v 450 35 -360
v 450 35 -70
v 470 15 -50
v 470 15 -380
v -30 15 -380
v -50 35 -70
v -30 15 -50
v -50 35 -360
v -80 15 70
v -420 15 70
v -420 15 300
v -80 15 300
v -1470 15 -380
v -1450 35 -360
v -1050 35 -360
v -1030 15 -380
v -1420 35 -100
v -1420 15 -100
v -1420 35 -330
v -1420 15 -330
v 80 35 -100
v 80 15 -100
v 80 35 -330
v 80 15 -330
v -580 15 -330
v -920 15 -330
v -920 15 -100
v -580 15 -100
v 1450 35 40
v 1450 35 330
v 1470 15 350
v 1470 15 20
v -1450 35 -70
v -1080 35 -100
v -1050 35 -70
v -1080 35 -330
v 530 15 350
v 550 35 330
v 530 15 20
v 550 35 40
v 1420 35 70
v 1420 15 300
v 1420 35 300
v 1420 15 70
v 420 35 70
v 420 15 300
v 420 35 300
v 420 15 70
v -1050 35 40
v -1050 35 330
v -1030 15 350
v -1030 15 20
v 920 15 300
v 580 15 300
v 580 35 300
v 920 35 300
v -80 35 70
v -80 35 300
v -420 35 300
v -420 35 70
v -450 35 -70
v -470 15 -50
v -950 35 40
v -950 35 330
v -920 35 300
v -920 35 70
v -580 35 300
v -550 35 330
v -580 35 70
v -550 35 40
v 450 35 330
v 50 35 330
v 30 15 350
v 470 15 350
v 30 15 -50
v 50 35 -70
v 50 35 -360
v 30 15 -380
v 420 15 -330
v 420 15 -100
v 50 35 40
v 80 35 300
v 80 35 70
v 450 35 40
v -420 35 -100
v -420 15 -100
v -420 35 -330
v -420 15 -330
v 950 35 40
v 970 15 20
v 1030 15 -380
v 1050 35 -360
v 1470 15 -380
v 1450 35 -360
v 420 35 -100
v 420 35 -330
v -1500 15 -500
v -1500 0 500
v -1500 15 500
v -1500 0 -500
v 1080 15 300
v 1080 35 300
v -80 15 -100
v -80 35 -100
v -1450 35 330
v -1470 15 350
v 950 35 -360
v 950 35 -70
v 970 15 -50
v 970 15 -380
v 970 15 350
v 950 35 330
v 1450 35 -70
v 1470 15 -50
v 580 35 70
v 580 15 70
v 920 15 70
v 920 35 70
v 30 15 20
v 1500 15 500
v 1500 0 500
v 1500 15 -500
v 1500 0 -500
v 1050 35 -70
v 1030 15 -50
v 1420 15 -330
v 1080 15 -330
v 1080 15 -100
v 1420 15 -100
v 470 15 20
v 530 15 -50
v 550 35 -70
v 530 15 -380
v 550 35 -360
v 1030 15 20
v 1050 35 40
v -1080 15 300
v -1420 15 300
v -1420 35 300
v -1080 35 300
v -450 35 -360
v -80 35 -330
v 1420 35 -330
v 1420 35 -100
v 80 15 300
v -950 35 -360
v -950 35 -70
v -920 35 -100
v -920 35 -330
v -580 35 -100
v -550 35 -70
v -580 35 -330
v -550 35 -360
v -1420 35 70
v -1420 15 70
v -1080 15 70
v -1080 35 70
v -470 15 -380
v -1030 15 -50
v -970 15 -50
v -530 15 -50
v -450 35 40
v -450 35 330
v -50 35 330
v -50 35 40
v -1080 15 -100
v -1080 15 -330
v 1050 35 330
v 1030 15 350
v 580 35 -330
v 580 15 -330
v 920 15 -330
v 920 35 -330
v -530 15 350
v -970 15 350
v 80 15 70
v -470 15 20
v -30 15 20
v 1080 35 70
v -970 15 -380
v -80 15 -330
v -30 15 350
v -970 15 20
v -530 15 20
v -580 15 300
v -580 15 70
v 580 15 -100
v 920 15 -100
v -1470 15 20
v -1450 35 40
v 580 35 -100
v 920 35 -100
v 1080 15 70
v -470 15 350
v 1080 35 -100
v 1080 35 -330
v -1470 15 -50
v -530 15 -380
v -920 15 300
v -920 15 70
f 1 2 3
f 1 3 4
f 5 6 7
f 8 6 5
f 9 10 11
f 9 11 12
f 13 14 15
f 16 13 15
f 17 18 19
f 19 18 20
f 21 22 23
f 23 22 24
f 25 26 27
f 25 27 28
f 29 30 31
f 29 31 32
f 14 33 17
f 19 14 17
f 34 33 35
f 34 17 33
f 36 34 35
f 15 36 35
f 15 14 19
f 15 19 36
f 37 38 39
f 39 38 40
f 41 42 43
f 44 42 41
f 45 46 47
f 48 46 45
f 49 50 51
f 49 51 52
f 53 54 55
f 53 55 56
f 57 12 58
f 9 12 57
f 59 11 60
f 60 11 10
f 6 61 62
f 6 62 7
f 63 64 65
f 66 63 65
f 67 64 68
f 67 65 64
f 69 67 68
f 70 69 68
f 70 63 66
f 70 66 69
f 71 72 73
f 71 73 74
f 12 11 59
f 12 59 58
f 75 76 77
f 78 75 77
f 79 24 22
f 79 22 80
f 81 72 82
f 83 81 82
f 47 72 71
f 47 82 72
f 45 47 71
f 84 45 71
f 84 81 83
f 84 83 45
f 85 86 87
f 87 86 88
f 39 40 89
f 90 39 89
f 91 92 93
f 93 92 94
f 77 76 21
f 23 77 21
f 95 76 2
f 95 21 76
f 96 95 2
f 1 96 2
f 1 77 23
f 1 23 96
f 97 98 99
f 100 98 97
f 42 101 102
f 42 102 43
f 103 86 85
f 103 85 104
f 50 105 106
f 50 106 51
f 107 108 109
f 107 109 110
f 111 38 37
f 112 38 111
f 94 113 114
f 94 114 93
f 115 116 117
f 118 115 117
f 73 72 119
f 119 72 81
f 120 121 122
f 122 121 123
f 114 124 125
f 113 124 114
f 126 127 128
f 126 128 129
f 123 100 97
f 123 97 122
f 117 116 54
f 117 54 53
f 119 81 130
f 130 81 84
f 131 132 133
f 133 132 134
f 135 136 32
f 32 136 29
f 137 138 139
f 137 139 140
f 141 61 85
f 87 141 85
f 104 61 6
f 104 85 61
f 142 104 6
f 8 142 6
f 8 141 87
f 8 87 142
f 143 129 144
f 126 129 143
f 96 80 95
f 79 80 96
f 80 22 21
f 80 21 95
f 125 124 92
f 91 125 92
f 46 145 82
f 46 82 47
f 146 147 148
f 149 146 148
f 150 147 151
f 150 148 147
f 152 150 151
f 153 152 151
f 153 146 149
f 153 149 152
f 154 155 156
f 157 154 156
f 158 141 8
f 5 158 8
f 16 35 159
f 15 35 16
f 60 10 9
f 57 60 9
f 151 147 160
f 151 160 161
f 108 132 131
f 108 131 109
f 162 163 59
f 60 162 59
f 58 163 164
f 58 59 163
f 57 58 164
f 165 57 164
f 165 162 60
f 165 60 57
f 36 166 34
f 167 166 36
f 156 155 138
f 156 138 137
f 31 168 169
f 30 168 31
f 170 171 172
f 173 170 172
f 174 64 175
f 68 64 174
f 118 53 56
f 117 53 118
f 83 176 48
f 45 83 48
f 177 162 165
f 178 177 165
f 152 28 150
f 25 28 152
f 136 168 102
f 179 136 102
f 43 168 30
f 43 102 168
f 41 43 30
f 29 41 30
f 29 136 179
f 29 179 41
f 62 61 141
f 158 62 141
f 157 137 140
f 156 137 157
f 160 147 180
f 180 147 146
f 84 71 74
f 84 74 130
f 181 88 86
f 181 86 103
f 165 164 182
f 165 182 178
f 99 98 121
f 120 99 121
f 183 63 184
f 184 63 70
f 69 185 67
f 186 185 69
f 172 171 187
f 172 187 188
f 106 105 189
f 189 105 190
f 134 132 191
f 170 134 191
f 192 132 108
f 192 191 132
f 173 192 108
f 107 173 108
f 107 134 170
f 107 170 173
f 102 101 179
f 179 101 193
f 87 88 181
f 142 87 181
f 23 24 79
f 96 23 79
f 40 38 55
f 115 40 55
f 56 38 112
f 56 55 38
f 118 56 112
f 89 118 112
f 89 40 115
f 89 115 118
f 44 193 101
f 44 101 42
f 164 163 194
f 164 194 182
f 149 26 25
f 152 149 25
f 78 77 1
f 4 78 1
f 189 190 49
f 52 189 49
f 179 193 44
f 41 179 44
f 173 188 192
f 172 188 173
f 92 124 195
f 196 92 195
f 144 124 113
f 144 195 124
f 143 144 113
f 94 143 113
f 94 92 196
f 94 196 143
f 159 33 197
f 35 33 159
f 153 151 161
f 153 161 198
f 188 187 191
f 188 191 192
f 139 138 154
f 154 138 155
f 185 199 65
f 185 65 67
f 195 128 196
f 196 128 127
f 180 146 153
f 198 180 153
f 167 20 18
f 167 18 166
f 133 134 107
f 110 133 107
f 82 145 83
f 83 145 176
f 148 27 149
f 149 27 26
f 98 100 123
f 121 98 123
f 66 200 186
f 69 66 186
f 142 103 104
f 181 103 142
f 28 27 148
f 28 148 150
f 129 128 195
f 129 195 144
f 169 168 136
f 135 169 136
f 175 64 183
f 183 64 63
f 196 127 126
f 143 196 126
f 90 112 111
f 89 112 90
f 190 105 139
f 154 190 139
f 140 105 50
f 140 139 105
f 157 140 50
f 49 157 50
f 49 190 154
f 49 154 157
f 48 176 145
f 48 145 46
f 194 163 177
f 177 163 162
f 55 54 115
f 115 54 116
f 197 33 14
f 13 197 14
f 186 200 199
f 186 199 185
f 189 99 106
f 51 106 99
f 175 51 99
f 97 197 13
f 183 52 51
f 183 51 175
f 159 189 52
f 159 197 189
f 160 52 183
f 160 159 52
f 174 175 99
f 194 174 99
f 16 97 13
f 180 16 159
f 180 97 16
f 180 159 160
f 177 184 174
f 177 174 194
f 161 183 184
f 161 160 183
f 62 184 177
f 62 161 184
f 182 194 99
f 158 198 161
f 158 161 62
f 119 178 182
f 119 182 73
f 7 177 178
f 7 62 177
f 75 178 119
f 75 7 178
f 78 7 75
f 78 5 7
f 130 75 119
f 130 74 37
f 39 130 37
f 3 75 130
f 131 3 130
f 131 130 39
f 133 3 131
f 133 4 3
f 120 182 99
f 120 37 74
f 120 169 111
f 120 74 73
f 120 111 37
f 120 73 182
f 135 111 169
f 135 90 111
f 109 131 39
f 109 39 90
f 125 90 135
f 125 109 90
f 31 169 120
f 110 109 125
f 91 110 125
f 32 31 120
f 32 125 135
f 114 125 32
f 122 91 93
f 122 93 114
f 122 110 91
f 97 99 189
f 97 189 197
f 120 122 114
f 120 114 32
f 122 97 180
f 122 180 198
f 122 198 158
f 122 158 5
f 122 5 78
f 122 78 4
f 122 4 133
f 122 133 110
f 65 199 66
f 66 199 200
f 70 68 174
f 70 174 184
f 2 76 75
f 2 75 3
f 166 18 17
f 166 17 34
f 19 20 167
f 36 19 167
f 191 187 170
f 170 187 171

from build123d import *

# Parameters (mm, degrees)
SKETCH1_W                  = 3000
SKETCH1_H                  = 1000
BOSS_EXTRUDE1_DEPTH        = 15
SKETCH2_W                  = 400
SKETCH2_H                  = 290
SKETCH2_W_2                = 340
SKETCH2_H_2                = 230
BOSS_EXTRUDE2_DEPTH        = 20
CHAMFER1_SIZE              = 20
LPATTERN1_COUNT            = 6
LPATTERN1_PITCH            = 500
LPATTERN1_COUNT_DIR2       = 2
LPATTERN1_PITCH_DIR2       = 400
CHAMFER1_OF_LPATTERN1_SIZE = 20


with BuildPart() as part:
    # Sketch1 → Boss-Extrude1 (new body)
    with BuildSketch(Plane(origin=(0, 0, 0), x_dir=(1, 0, 0), z_dir=(0, 1, 0))):
        Rectangle(SKETCH1_W, SKETCH1_H)
    extrude(amount=BOSS_EXTRUDE1_DEPTH)

    # Sketch2 → Boss-Extrude2 (add)
    with BuildSketch(Plane(origin=(0, 15, 0), x_dir=(1, 0, 0), z_dir=(0, 1, 0))):
        with Locations((-1250, -185)):
            Rectangle(SKETCH2_W, SKETCH2_H)
        with Locations((-1250, -185)):
            Rectangle(SKETCH2_W_2, SKETCH2_H_2, mode=Mode.SUBTRACT)
    boss_extrude2 = extrude(amount=BOSS_EXTRUDE2_DEPTH)

    # Chamfer1
    chamfer1_edges = [part.edges().sort_by_distance(p)[0] for p in [
        (-1450, 15, 185),
        (-1050, 15, 185),
        (-1250, 15, 330),
        (-1250, 15, 40),
    ]]
    chamfer(chamfer1_edges, length=CHAMFER1_SIZE - 0.0001)  # a hair under: the kernel refuses the full size

    # LPattern1: Boss-Extrude2 6 × 2
    with Locations(*[(i * LPATTERN1_PITCH, 0, -j * LPATTERN1_PITCH_DIR2) for i in range(LPATTERN1_COUNT) for j in range(LPATTERN1_COUNT_DIR2) if (i, j) != (0, 0)]):
        add(boss_extrude2)

    # Chamfer1 of LPattern1
    chamfer1_of_lpattern1_edges = [part.edges().sort_by_distance(p)[0] for p in [
        (-1450, 15, -215),
        (-1050, 15, -215),
        (-1250, 15, -70),
        (-1250, 15, -360),
        (-950, 15, 185),
        (-550, 15, 185),
        (-750, 15, 330),
        (-750, 15, 40),
        (-950, 15, -215),
        (-550, 15, -215),
        (-750, 15, -70),
        (-750, 15, -360),
        (-450, 15, 185),
        (-50, 15, 185),
        (-250, 15, 330),
        (-250, 15, 40),
        (-450, 15, -215),
        (-50, 15, -215),
        (-250, 15, -70),
        (-250, 15, -360),
        (50, 15, 185),
        (450, 15, 185),
        (250, 15, 330),
        (250, 15, 40),
        (50, 15, -215),
        (450, 15, -215),
        (250, 15, -70),
        (250, 15, -360),
        (550, 15, 185),
        (950, 15, 185),
        (750, 15, 330),
        (750, 15, 40),
        (550, 15, -215),
        (950, 15, -215),
        (750, 15, -70),
        (750, 15, -360),
        (1050, 15, 185),
        (1450, 15, 185),
        (1250, 15, 330),
        (1250, 15, 40),
        (1050, 15, -215),
        (1450, 15, -215),
        (1250, 15, -70),
        (1250, 15, -360),
    ]]
    chamfer(chamfer1_of_lpattern1_edges, length=CHAMFER1_OF_LPATTERN1_SIZE - 0.0001)  # a hair under: the kernel refuses the full size


solid = part.part
